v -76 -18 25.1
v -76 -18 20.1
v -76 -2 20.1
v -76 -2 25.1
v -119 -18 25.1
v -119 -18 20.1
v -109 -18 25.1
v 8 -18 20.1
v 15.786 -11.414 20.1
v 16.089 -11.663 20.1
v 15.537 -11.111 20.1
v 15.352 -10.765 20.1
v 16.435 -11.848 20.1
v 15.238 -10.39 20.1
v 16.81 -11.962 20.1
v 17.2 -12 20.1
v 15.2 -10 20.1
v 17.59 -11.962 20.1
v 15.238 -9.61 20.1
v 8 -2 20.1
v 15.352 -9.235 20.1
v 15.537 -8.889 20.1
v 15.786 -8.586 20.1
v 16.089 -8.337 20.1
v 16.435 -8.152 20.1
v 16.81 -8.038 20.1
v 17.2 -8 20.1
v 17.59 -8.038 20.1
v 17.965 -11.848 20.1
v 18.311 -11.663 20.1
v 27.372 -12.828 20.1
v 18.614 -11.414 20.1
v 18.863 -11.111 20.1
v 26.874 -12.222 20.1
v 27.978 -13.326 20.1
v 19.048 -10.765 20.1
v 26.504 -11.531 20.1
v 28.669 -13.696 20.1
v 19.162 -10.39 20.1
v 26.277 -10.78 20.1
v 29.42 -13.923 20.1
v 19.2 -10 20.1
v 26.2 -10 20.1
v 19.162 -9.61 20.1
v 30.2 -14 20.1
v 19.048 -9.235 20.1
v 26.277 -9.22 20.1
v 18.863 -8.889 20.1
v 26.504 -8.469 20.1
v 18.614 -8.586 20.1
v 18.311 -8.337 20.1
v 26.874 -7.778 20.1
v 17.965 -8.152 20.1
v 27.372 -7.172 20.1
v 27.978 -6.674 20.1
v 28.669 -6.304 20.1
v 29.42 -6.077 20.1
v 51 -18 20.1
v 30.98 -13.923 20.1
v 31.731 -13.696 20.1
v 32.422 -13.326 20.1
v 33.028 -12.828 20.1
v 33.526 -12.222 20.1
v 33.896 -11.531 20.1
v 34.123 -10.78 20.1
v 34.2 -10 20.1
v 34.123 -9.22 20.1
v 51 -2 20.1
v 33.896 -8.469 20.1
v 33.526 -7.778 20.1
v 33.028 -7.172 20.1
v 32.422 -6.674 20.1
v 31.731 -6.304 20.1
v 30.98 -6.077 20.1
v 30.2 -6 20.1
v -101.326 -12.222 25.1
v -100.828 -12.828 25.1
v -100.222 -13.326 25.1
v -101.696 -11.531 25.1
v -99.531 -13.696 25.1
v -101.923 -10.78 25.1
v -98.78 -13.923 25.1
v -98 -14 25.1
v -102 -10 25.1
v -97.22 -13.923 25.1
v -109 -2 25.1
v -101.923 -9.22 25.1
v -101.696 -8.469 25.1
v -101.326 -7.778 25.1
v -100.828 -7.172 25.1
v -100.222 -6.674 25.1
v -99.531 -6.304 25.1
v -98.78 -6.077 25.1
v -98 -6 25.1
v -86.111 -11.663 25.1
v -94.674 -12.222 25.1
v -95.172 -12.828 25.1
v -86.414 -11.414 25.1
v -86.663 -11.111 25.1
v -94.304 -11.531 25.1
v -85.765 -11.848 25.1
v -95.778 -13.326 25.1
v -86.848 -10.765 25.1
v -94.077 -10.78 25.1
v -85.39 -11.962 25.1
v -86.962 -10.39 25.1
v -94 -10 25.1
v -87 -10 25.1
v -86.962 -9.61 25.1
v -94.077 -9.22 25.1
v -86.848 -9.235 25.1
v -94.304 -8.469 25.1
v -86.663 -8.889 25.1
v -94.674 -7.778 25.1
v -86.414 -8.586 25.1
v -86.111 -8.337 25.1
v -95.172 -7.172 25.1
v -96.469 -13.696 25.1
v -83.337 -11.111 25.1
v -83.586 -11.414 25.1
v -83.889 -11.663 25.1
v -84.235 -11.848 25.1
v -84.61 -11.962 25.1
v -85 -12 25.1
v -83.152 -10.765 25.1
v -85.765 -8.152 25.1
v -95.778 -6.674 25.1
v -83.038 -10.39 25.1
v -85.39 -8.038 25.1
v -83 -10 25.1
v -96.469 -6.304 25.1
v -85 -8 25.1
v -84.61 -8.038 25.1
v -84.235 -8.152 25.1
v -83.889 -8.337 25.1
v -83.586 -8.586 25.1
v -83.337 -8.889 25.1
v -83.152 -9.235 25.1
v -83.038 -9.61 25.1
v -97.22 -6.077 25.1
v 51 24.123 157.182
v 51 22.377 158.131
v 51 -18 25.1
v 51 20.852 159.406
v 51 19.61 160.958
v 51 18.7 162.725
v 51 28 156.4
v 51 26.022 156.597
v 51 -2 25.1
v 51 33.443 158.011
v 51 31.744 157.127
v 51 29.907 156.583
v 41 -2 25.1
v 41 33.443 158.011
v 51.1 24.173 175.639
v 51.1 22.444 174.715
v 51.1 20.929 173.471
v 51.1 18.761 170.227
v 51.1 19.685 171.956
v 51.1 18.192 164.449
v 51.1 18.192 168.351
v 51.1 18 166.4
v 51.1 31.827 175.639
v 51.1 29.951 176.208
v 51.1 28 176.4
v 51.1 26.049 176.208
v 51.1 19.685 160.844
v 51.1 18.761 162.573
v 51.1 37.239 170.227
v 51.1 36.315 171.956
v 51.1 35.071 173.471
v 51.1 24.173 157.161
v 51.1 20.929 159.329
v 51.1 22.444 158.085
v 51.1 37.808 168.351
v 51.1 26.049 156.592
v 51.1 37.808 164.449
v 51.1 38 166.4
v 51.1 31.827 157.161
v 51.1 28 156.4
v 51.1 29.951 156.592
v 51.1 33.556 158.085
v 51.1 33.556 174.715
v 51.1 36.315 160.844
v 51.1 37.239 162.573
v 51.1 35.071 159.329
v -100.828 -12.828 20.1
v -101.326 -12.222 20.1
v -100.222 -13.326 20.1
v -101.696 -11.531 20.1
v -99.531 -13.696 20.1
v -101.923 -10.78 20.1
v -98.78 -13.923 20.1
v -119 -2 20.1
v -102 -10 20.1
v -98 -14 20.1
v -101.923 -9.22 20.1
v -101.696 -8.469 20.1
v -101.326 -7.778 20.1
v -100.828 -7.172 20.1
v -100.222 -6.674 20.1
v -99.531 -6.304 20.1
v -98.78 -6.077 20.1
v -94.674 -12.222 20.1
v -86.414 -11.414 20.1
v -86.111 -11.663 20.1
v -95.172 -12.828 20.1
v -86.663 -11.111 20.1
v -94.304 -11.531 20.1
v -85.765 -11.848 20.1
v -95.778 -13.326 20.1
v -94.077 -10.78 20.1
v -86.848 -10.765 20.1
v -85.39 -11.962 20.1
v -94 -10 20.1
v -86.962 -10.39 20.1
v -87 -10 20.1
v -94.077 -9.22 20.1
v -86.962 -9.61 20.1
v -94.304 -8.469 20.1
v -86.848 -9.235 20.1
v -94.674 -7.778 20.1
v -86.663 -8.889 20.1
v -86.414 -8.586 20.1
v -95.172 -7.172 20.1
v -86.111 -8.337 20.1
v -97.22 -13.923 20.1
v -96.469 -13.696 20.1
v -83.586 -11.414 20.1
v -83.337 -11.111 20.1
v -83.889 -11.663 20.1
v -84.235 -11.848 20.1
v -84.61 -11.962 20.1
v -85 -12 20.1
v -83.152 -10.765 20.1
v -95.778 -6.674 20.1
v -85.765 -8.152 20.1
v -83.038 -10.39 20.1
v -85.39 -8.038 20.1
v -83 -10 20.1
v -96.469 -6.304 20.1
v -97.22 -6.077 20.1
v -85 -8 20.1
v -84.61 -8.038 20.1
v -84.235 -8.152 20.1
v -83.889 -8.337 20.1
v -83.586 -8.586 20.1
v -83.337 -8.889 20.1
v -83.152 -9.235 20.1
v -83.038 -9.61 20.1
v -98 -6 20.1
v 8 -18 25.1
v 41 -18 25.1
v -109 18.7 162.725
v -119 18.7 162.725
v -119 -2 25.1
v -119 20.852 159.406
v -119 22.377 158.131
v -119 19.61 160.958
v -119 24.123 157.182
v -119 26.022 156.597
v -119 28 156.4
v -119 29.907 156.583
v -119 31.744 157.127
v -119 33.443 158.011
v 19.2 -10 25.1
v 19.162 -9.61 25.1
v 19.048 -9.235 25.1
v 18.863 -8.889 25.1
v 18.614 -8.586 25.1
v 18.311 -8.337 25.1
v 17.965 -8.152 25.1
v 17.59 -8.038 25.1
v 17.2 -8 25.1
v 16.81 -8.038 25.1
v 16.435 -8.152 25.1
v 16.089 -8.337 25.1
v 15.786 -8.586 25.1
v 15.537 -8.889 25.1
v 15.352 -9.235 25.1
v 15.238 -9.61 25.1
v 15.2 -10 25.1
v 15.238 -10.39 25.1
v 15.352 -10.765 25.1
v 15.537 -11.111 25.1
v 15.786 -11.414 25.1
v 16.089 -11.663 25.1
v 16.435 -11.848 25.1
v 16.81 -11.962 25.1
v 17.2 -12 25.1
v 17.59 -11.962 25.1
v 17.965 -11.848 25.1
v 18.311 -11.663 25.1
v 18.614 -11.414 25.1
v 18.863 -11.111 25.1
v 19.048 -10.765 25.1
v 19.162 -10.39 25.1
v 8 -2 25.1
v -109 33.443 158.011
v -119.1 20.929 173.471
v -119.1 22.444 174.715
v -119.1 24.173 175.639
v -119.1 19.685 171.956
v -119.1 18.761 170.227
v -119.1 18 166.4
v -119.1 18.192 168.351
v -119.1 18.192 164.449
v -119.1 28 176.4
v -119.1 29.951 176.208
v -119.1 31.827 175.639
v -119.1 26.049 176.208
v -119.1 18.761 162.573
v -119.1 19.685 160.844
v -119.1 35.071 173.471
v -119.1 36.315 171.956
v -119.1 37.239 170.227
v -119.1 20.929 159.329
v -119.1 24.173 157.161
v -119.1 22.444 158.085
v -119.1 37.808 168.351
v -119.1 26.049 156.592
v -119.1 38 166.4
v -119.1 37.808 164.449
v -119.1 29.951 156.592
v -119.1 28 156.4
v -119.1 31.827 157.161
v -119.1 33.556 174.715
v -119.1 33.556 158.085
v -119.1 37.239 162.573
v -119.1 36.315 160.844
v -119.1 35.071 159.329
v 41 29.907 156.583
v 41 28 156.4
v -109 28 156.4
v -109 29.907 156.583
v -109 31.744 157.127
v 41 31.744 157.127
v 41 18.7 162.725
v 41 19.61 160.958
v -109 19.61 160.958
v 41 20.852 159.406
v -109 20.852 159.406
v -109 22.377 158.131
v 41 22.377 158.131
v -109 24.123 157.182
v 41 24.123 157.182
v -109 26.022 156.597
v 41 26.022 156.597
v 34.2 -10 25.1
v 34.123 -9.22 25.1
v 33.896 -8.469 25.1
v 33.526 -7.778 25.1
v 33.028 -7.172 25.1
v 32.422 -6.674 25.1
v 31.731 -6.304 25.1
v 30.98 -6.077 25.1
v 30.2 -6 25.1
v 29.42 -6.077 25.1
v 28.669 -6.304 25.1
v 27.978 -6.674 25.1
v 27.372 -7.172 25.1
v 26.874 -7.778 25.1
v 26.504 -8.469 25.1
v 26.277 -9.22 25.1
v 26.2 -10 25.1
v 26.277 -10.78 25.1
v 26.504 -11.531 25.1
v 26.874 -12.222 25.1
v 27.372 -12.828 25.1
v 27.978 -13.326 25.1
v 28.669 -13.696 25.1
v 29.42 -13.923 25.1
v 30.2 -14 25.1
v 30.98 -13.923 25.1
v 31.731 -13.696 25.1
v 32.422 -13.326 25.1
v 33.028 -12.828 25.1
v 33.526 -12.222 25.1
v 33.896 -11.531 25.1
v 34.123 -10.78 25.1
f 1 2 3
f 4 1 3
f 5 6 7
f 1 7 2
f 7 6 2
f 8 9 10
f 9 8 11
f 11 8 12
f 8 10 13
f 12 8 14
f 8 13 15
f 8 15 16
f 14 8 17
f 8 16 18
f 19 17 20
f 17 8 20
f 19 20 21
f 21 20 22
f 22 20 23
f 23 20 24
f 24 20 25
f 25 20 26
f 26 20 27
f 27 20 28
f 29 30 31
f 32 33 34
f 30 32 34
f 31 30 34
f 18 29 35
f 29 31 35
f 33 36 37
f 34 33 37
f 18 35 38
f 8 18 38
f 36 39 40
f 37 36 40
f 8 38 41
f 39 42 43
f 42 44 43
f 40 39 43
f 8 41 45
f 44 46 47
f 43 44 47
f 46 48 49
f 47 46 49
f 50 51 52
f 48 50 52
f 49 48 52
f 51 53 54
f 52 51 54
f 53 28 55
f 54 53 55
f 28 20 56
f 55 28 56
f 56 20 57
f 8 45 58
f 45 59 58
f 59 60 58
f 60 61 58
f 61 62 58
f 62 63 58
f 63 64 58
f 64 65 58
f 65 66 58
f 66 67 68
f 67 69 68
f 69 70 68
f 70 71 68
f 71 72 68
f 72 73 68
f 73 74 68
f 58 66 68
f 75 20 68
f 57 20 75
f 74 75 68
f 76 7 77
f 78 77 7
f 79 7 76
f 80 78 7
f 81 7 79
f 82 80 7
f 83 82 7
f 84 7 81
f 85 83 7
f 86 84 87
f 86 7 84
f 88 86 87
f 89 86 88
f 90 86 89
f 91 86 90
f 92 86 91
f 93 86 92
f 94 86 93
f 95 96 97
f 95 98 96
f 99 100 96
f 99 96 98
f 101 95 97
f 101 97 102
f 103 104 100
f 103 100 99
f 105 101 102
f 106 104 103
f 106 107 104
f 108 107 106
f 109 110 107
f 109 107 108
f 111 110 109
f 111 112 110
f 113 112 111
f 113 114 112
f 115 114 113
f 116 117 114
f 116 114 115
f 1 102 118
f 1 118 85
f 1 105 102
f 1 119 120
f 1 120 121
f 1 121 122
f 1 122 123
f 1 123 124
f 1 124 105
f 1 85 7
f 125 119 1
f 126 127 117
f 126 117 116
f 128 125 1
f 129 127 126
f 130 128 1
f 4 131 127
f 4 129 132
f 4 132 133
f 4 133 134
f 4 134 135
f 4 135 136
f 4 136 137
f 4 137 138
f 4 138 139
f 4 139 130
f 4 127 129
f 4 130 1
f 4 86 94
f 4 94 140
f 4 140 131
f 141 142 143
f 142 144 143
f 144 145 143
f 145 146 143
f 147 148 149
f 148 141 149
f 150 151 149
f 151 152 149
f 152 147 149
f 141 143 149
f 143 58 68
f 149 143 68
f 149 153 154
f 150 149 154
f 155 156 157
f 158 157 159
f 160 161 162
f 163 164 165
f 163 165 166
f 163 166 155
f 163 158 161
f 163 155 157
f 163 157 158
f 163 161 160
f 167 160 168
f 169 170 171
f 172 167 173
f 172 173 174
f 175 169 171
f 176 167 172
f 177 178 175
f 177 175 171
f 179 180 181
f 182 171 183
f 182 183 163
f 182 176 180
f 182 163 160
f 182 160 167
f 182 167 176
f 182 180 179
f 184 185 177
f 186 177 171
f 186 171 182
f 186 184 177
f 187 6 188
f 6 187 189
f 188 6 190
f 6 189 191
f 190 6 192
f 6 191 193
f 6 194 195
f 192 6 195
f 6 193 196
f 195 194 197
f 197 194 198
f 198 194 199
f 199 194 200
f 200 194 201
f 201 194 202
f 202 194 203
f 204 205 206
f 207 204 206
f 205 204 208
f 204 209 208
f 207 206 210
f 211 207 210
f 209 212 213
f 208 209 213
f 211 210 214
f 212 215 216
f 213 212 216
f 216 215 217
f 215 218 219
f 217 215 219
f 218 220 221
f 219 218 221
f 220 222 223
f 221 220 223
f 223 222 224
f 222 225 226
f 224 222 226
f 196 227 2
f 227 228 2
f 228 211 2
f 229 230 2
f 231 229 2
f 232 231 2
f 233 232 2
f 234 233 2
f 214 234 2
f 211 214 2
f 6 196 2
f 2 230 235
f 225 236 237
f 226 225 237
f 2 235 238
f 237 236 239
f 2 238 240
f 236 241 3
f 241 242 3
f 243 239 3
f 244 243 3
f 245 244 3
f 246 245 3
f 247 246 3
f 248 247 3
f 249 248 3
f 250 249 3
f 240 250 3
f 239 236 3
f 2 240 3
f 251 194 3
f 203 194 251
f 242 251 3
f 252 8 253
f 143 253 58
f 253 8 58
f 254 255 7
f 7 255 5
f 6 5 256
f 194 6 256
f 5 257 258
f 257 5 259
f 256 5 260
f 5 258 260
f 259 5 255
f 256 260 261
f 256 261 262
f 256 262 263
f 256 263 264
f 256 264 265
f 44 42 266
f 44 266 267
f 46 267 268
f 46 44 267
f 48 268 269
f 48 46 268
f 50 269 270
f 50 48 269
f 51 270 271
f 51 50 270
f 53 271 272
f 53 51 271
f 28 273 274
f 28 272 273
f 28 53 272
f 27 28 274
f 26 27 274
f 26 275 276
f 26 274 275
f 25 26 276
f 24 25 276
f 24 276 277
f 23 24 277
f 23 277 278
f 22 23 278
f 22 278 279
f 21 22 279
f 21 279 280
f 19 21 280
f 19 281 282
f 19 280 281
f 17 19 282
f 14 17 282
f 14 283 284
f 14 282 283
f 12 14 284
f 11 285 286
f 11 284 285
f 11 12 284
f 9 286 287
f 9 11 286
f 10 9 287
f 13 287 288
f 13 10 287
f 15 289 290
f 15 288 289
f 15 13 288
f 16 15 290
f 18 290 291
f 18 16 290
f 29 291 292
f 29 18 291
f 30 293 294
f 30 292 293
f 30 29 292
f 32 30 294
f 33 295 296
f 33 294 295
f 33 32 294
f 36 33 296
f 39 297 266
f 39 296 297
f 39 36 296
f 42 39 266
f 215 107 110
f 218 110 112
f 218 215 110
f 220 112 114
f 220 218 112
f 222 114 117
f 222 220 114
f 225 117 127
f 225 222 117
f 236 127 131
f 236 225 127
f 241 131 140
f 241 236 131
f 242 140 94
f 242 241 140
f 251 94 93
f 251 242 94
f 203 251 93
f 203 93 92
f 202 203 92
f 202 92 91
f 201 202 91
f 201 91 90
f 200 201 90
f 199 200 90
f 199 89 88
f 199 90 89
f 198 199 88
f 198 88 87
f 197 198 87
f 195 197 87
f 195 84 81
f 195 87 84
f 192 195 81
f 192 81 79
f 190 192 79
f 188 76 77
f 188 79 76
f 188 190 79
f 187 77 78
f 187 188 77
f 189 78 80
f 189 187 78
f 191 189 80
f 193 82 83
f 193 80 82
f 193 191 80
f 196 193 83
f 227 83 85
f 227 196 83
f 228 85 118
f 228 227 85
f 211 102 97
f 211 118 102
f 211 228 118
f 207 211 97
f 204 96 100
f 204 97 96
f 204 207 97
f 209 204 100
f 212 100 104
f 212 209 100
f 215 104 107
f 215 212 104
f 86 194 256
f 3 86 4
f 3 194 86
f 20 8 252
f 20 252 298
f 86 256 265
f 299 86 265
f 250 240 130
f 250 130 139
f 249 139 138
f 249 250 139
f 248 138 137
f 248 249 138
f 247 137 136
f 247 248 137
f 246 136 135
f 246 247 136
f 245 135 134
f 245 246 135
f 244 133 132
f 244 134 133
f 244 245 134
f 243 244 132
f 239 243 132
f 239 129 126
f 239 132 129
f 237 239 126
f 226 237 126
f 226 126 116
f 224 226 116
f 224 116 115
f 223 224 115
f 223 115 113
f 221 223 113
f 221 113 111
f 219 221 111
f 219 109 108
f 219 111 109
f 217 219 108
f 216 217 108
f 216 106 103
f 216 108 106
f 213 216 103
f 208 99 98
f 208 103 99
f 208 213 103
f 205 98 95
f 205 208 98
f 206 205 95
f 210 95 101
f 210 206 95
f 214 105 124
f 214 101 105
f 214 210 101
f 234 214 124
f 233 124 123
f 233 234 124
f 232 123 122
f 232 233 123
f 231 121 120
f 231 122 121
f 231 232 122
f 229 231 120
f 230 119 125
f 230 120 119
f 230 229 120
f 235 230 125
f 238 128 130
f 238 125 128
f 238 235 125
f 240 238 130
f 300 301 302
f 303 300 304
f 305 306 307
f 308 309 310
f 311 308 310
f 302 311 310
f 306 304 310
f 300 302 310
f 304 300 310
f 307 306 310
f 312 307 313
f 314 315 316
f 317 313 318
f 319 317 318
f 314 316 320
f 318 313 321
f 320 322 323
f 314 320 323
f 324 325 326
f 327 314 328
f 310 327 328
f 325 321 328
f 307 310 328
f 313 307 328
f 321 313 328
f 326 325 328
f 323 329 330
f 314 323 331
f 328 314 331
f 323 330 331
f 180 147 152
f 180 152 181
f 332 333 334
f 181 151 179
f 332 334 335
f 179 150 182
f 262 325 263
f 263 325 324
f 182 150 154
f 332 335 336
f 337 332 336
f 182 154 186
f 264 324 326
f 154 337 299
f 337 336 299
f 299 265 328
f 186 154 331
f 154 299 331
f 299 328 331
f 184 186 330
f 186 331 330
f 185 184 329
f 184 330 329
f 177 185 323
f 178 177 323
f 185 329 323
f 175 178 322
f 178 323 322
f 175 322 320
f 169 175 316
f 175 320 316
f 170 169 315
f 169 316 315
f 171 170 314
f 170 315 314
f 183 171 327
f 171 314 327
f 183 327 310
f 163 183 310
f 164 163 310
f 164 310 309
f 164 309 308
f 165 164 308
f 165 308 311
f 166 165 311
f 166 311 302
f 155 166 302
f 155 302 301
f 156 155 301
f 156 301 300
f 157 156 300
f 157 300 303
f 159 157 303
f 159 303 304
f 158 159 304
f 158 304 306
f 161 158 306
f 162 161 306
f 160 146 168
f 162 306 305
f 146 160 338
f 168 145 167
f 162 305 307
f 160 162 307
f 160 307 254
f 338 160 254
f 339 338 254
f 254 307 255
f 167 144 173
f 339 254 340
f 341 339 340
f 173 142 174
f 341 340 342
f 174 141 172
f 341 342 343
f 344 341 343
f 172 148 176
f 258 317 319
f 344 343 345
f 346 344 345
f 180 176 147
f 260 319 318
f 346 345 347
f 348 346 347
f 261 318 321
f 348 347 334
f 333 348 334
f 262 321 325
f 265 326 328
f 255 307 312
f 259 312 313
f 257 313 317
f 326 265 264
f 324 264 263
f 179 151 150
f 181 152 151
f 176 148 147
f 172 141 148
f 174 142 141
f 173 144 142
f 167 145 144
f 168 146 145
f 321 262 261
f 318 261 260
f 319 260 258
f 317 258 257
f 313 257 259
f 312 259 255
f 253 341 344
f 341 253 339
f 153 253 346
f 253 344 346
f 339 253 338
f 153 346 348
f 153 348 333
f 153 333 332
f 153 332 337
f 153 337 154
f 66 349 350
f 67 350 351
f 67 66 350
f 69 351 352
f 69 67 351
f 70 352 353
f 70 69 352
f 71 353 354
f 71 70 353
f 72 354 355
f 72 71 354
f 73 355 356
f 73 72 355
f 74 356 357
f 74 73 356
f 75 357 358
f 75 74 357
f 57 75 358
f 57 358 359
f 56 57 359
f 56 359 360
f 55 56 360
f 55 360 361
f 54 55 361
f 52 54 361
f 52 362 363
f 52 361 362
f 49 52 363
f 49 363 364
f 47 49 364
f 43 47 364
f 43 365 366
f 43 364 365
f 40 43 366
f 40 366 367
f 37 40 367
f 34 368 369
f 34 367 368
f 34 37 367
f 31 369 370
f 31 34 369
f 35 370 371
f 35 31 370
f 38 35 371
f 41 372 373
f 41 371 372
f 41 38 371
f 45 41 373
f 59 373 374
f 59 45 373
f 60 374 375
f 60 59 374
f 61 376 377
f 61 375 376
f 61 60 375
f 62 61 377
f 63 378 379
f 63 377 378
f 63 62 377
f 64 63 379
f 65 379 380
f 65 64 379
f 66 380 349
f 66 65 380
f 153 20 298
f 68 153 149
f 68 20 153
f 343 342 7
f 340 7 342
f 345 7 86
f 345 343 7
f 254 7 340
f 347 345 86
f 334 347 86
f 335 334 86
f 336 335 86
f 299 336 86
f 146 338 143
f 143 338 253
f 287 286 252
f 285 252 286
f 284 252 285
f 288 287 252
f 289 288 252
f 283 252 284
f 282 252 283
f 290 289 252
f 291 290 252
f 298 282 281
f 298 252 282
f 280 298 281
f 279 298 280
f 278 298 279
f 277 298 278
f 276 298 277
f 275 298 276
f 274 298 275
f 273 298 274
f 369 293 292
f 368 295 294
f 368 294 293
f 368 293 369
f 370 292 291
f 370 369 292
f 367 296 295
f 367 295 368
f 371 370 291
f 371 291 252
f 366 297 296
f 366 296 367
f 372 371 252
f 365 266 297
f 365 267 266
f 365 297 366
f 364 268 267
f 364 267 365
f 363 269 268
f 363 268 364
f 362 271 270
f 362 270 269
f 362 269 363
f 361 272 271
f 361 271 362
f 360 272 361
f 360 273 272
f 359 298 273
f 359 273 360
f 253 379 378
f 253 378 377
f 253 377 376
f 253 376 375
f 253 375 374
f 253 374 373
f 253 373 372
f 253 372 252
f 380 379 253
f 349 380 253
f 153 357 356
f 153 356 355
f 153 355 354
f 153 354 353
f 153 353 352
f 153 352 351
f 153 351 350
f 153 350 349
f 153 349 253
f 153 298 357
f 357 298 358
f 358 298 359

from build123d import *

# Parameters (mm, degrees)
CYLINDER127_R             = 10
CYLINDER127_DEPTH         = 170.2
EXTRUDE010_DEPTH          = 10
FILLET003_R               = 7.72
FILLET003_ROLL_ANGLE      = 90
FILLET003_PLACEMENT_ANGLE = 90
EXTRUDE009_DEPTH          = 10
FILLET002_R               = 7.72
FILLET002_ROLL_ANGLE      = 90
FILLET002_PLACEMENT_ANGLE = 90
CYLINDER237_R             = 2
CYLINDER237_DEPTH         = 42
CYLINDER033_R             = 4
CYLINDER033_DEPTH         = 32
BOX309_W                  = 43
BOX309_H                  = 16
BOX309_DEPTH              = 5
CYLINDER236_R             = 2
CYLINDER236_DEPTH         = 42
CYLINDER034_R             = 4
CYLINDER034_DEPTH         = 32
BOX310_W                  = 43
BOX310_H                  = 16
BOX310_DEPTH              = 5


with BuildPart() as cylinder127:
    # Cylinder127 → Cylinder127 (new body)
    with BuildSketch(Plane(origin=(-119.1, 28, 146.3), x_dir=(0, 0, -1), z_dir=(1, 0, 0))):
        Circle(CYLINDER127_R)
    extrude(amount=CYLINDER127_DEPTH)


with BuildPart() as fillet003:
    # Wire005 → Extrude010 (new body)
    with BuildSketch(Plane.XY):
        Polygon((0, 0), (16, 0), (56, 150), (40, 150), align=None)
    extrude(amount=EXTRUDE010_DEPTH)

    # Fillet003
    fillet003_edges = [fillet003.edges().sort_by_distance(p)[0] for p in [
        (56, 150, 5),
        (40, 150, 5),
    ]]
    fillet(fillet003_edges, radius=FILLET003_R)


with BuildPart() as fillet003_1:
    # Fillet003 roll: moved
    add(fillet003.part.rotate(Axis((0, 0, 0), (1, 0, 0)), FILLET003_ROLL_ANGLE))


with BuildPart() as fillet003_2:
    # Fillet003 placement: moved
    add(fillet003_1.part.moved(Location((-119, -18, 5))).rotate(Axis((-119, -18, 5), (0, 0, 1)), FILLET003_PLACEMENT_ANGLE))


with BuildPart() as fusion167:
    # Wire004 → Extrude009 (new body)
    with BuildSketch(Plane.XY):
        Polygon((0, 0), (16, 0), (56, 150), (40, 150), align=None)
    extrude(amount=EXTRUDE009_DEPTH)

    # Fillet002
    fillet002_edges = [fusion167.edges().sort_by_distance(p)[0] for p in [
        (56, 150, 5),
        (40, 150, 5),
    ]]
    fillet(fillet002_edges, radius=FILLET002_R)


with BuildPart() as fusion167_1:
    # Fillet002 roll: moved
    add(fusion167.part.rotate(Axis((0, 0, 0), (1, 0, 0)), FILLET002_ROLL_ANGLE))


with BuildPart() as fusion167_2:
    # Fillet002 placement: moved
    add(fusion167_1.part.moved(Location((41, -18, 5))).rotate(Axis((41, -18, 5), (0, 0, 1)), FILLET002_PLACEMENT_ANGLE))

    # Fusion167: union Cylinder127, Fillet003
    add(cylinder127.part)
    add(fillet003_2.part)


with BuildPart() as cylinder237:
    # Cylinder237 → Cylinder237 (new body)
    with BuildSketch(Plane(origin=(17.2, -10, -5), x_dir=(1, 0, 0), z_dir=(0, 0, 1))):
        Circle(CYLINDER237_R)
    extrude(amount=CYLINDER237_DEPTH)


with BuildPart() as cylinder033:
    # Cylinder033 → Cylinder033 (new body)
    with BuildSketch(Plane(origin=(30.2, -10, 0), x_dir=(1, 0, 0), z_dir=(0, 0, 1))):
        Circle(CYLINDER033_R)
    extrude(amount=CYLINDER033_DEPTH)


with BuildPart() as cut203:
    # Box309 → Box309 (new body)
    with BuildSketch(Plane(origin=(8, -18, 0), x_dir=(1, 0, 0), z_dir=(0, 0, 1))):
        with Locations((21.5, 8)):
            Rectangle(BOX309_W, BOX309_H)
    extrude(amount=BOX309_DEPTH)

    # Cut187: cut Cylinder033
    add(cylinder033.part, mode=Mode.SUBTRACT)

    # Cut203: cut Cylinder237
    add(cylinder237.part, mode=Mode.SUBTRACT)


with BuildPart() as cylinder236:
    # Cylinder236 → Cylinder236 (new body)
    with BuildSketch(Plane(origin=(-85, -10, -5), x_dir=(1, 0, 0), z_dir=(0, 0, 1))):
        Circle(CYLINDER236_R)
    extrude(amount=CYLINDER236_DEPTH)


with BuildPart() as cylinder034:
    # Cylinder034 → Cylinder034 (new body)
    with BuildSketch(Plane(origin=(-98, -10, 0), x_dir=(1, 0, 0), z_dir=(0, 0, 1))):
        Circle(CYLINDER034_R)
    extrude(amount=CYLINDER034_DEPTH)


with BuildPart() as handle:
    # Box310 → Box310 (new body)
    with BuildSketch(Plane(origin=(-119, -18, 0), x_dir=(1, 0, 0), z_dir=(0, 0, 1))):
        with Locations((21.5, 8)):
            Rectangle(BOX310_W, BOX310_H)
    extrude(amount=BOX310_DEPTH)

    # Cut183: cut Cylinder034
    add(cylinder034.part, mode=Mode.SUBTRACT)

    # Cut202: cut Cylinder236
    add(cylinder236.part, mode=Mode.SUBTRACT)

    # Fusion169: union Fusion167, Cut203
    add(fusion167_2.part)
    add(cut203.part)


with BuildPart() as handle_1:
    # Fusion169 placement: moved
    add(handle.part.moved(Location((0, 0, 20.1))))


solid = handle_1.part
